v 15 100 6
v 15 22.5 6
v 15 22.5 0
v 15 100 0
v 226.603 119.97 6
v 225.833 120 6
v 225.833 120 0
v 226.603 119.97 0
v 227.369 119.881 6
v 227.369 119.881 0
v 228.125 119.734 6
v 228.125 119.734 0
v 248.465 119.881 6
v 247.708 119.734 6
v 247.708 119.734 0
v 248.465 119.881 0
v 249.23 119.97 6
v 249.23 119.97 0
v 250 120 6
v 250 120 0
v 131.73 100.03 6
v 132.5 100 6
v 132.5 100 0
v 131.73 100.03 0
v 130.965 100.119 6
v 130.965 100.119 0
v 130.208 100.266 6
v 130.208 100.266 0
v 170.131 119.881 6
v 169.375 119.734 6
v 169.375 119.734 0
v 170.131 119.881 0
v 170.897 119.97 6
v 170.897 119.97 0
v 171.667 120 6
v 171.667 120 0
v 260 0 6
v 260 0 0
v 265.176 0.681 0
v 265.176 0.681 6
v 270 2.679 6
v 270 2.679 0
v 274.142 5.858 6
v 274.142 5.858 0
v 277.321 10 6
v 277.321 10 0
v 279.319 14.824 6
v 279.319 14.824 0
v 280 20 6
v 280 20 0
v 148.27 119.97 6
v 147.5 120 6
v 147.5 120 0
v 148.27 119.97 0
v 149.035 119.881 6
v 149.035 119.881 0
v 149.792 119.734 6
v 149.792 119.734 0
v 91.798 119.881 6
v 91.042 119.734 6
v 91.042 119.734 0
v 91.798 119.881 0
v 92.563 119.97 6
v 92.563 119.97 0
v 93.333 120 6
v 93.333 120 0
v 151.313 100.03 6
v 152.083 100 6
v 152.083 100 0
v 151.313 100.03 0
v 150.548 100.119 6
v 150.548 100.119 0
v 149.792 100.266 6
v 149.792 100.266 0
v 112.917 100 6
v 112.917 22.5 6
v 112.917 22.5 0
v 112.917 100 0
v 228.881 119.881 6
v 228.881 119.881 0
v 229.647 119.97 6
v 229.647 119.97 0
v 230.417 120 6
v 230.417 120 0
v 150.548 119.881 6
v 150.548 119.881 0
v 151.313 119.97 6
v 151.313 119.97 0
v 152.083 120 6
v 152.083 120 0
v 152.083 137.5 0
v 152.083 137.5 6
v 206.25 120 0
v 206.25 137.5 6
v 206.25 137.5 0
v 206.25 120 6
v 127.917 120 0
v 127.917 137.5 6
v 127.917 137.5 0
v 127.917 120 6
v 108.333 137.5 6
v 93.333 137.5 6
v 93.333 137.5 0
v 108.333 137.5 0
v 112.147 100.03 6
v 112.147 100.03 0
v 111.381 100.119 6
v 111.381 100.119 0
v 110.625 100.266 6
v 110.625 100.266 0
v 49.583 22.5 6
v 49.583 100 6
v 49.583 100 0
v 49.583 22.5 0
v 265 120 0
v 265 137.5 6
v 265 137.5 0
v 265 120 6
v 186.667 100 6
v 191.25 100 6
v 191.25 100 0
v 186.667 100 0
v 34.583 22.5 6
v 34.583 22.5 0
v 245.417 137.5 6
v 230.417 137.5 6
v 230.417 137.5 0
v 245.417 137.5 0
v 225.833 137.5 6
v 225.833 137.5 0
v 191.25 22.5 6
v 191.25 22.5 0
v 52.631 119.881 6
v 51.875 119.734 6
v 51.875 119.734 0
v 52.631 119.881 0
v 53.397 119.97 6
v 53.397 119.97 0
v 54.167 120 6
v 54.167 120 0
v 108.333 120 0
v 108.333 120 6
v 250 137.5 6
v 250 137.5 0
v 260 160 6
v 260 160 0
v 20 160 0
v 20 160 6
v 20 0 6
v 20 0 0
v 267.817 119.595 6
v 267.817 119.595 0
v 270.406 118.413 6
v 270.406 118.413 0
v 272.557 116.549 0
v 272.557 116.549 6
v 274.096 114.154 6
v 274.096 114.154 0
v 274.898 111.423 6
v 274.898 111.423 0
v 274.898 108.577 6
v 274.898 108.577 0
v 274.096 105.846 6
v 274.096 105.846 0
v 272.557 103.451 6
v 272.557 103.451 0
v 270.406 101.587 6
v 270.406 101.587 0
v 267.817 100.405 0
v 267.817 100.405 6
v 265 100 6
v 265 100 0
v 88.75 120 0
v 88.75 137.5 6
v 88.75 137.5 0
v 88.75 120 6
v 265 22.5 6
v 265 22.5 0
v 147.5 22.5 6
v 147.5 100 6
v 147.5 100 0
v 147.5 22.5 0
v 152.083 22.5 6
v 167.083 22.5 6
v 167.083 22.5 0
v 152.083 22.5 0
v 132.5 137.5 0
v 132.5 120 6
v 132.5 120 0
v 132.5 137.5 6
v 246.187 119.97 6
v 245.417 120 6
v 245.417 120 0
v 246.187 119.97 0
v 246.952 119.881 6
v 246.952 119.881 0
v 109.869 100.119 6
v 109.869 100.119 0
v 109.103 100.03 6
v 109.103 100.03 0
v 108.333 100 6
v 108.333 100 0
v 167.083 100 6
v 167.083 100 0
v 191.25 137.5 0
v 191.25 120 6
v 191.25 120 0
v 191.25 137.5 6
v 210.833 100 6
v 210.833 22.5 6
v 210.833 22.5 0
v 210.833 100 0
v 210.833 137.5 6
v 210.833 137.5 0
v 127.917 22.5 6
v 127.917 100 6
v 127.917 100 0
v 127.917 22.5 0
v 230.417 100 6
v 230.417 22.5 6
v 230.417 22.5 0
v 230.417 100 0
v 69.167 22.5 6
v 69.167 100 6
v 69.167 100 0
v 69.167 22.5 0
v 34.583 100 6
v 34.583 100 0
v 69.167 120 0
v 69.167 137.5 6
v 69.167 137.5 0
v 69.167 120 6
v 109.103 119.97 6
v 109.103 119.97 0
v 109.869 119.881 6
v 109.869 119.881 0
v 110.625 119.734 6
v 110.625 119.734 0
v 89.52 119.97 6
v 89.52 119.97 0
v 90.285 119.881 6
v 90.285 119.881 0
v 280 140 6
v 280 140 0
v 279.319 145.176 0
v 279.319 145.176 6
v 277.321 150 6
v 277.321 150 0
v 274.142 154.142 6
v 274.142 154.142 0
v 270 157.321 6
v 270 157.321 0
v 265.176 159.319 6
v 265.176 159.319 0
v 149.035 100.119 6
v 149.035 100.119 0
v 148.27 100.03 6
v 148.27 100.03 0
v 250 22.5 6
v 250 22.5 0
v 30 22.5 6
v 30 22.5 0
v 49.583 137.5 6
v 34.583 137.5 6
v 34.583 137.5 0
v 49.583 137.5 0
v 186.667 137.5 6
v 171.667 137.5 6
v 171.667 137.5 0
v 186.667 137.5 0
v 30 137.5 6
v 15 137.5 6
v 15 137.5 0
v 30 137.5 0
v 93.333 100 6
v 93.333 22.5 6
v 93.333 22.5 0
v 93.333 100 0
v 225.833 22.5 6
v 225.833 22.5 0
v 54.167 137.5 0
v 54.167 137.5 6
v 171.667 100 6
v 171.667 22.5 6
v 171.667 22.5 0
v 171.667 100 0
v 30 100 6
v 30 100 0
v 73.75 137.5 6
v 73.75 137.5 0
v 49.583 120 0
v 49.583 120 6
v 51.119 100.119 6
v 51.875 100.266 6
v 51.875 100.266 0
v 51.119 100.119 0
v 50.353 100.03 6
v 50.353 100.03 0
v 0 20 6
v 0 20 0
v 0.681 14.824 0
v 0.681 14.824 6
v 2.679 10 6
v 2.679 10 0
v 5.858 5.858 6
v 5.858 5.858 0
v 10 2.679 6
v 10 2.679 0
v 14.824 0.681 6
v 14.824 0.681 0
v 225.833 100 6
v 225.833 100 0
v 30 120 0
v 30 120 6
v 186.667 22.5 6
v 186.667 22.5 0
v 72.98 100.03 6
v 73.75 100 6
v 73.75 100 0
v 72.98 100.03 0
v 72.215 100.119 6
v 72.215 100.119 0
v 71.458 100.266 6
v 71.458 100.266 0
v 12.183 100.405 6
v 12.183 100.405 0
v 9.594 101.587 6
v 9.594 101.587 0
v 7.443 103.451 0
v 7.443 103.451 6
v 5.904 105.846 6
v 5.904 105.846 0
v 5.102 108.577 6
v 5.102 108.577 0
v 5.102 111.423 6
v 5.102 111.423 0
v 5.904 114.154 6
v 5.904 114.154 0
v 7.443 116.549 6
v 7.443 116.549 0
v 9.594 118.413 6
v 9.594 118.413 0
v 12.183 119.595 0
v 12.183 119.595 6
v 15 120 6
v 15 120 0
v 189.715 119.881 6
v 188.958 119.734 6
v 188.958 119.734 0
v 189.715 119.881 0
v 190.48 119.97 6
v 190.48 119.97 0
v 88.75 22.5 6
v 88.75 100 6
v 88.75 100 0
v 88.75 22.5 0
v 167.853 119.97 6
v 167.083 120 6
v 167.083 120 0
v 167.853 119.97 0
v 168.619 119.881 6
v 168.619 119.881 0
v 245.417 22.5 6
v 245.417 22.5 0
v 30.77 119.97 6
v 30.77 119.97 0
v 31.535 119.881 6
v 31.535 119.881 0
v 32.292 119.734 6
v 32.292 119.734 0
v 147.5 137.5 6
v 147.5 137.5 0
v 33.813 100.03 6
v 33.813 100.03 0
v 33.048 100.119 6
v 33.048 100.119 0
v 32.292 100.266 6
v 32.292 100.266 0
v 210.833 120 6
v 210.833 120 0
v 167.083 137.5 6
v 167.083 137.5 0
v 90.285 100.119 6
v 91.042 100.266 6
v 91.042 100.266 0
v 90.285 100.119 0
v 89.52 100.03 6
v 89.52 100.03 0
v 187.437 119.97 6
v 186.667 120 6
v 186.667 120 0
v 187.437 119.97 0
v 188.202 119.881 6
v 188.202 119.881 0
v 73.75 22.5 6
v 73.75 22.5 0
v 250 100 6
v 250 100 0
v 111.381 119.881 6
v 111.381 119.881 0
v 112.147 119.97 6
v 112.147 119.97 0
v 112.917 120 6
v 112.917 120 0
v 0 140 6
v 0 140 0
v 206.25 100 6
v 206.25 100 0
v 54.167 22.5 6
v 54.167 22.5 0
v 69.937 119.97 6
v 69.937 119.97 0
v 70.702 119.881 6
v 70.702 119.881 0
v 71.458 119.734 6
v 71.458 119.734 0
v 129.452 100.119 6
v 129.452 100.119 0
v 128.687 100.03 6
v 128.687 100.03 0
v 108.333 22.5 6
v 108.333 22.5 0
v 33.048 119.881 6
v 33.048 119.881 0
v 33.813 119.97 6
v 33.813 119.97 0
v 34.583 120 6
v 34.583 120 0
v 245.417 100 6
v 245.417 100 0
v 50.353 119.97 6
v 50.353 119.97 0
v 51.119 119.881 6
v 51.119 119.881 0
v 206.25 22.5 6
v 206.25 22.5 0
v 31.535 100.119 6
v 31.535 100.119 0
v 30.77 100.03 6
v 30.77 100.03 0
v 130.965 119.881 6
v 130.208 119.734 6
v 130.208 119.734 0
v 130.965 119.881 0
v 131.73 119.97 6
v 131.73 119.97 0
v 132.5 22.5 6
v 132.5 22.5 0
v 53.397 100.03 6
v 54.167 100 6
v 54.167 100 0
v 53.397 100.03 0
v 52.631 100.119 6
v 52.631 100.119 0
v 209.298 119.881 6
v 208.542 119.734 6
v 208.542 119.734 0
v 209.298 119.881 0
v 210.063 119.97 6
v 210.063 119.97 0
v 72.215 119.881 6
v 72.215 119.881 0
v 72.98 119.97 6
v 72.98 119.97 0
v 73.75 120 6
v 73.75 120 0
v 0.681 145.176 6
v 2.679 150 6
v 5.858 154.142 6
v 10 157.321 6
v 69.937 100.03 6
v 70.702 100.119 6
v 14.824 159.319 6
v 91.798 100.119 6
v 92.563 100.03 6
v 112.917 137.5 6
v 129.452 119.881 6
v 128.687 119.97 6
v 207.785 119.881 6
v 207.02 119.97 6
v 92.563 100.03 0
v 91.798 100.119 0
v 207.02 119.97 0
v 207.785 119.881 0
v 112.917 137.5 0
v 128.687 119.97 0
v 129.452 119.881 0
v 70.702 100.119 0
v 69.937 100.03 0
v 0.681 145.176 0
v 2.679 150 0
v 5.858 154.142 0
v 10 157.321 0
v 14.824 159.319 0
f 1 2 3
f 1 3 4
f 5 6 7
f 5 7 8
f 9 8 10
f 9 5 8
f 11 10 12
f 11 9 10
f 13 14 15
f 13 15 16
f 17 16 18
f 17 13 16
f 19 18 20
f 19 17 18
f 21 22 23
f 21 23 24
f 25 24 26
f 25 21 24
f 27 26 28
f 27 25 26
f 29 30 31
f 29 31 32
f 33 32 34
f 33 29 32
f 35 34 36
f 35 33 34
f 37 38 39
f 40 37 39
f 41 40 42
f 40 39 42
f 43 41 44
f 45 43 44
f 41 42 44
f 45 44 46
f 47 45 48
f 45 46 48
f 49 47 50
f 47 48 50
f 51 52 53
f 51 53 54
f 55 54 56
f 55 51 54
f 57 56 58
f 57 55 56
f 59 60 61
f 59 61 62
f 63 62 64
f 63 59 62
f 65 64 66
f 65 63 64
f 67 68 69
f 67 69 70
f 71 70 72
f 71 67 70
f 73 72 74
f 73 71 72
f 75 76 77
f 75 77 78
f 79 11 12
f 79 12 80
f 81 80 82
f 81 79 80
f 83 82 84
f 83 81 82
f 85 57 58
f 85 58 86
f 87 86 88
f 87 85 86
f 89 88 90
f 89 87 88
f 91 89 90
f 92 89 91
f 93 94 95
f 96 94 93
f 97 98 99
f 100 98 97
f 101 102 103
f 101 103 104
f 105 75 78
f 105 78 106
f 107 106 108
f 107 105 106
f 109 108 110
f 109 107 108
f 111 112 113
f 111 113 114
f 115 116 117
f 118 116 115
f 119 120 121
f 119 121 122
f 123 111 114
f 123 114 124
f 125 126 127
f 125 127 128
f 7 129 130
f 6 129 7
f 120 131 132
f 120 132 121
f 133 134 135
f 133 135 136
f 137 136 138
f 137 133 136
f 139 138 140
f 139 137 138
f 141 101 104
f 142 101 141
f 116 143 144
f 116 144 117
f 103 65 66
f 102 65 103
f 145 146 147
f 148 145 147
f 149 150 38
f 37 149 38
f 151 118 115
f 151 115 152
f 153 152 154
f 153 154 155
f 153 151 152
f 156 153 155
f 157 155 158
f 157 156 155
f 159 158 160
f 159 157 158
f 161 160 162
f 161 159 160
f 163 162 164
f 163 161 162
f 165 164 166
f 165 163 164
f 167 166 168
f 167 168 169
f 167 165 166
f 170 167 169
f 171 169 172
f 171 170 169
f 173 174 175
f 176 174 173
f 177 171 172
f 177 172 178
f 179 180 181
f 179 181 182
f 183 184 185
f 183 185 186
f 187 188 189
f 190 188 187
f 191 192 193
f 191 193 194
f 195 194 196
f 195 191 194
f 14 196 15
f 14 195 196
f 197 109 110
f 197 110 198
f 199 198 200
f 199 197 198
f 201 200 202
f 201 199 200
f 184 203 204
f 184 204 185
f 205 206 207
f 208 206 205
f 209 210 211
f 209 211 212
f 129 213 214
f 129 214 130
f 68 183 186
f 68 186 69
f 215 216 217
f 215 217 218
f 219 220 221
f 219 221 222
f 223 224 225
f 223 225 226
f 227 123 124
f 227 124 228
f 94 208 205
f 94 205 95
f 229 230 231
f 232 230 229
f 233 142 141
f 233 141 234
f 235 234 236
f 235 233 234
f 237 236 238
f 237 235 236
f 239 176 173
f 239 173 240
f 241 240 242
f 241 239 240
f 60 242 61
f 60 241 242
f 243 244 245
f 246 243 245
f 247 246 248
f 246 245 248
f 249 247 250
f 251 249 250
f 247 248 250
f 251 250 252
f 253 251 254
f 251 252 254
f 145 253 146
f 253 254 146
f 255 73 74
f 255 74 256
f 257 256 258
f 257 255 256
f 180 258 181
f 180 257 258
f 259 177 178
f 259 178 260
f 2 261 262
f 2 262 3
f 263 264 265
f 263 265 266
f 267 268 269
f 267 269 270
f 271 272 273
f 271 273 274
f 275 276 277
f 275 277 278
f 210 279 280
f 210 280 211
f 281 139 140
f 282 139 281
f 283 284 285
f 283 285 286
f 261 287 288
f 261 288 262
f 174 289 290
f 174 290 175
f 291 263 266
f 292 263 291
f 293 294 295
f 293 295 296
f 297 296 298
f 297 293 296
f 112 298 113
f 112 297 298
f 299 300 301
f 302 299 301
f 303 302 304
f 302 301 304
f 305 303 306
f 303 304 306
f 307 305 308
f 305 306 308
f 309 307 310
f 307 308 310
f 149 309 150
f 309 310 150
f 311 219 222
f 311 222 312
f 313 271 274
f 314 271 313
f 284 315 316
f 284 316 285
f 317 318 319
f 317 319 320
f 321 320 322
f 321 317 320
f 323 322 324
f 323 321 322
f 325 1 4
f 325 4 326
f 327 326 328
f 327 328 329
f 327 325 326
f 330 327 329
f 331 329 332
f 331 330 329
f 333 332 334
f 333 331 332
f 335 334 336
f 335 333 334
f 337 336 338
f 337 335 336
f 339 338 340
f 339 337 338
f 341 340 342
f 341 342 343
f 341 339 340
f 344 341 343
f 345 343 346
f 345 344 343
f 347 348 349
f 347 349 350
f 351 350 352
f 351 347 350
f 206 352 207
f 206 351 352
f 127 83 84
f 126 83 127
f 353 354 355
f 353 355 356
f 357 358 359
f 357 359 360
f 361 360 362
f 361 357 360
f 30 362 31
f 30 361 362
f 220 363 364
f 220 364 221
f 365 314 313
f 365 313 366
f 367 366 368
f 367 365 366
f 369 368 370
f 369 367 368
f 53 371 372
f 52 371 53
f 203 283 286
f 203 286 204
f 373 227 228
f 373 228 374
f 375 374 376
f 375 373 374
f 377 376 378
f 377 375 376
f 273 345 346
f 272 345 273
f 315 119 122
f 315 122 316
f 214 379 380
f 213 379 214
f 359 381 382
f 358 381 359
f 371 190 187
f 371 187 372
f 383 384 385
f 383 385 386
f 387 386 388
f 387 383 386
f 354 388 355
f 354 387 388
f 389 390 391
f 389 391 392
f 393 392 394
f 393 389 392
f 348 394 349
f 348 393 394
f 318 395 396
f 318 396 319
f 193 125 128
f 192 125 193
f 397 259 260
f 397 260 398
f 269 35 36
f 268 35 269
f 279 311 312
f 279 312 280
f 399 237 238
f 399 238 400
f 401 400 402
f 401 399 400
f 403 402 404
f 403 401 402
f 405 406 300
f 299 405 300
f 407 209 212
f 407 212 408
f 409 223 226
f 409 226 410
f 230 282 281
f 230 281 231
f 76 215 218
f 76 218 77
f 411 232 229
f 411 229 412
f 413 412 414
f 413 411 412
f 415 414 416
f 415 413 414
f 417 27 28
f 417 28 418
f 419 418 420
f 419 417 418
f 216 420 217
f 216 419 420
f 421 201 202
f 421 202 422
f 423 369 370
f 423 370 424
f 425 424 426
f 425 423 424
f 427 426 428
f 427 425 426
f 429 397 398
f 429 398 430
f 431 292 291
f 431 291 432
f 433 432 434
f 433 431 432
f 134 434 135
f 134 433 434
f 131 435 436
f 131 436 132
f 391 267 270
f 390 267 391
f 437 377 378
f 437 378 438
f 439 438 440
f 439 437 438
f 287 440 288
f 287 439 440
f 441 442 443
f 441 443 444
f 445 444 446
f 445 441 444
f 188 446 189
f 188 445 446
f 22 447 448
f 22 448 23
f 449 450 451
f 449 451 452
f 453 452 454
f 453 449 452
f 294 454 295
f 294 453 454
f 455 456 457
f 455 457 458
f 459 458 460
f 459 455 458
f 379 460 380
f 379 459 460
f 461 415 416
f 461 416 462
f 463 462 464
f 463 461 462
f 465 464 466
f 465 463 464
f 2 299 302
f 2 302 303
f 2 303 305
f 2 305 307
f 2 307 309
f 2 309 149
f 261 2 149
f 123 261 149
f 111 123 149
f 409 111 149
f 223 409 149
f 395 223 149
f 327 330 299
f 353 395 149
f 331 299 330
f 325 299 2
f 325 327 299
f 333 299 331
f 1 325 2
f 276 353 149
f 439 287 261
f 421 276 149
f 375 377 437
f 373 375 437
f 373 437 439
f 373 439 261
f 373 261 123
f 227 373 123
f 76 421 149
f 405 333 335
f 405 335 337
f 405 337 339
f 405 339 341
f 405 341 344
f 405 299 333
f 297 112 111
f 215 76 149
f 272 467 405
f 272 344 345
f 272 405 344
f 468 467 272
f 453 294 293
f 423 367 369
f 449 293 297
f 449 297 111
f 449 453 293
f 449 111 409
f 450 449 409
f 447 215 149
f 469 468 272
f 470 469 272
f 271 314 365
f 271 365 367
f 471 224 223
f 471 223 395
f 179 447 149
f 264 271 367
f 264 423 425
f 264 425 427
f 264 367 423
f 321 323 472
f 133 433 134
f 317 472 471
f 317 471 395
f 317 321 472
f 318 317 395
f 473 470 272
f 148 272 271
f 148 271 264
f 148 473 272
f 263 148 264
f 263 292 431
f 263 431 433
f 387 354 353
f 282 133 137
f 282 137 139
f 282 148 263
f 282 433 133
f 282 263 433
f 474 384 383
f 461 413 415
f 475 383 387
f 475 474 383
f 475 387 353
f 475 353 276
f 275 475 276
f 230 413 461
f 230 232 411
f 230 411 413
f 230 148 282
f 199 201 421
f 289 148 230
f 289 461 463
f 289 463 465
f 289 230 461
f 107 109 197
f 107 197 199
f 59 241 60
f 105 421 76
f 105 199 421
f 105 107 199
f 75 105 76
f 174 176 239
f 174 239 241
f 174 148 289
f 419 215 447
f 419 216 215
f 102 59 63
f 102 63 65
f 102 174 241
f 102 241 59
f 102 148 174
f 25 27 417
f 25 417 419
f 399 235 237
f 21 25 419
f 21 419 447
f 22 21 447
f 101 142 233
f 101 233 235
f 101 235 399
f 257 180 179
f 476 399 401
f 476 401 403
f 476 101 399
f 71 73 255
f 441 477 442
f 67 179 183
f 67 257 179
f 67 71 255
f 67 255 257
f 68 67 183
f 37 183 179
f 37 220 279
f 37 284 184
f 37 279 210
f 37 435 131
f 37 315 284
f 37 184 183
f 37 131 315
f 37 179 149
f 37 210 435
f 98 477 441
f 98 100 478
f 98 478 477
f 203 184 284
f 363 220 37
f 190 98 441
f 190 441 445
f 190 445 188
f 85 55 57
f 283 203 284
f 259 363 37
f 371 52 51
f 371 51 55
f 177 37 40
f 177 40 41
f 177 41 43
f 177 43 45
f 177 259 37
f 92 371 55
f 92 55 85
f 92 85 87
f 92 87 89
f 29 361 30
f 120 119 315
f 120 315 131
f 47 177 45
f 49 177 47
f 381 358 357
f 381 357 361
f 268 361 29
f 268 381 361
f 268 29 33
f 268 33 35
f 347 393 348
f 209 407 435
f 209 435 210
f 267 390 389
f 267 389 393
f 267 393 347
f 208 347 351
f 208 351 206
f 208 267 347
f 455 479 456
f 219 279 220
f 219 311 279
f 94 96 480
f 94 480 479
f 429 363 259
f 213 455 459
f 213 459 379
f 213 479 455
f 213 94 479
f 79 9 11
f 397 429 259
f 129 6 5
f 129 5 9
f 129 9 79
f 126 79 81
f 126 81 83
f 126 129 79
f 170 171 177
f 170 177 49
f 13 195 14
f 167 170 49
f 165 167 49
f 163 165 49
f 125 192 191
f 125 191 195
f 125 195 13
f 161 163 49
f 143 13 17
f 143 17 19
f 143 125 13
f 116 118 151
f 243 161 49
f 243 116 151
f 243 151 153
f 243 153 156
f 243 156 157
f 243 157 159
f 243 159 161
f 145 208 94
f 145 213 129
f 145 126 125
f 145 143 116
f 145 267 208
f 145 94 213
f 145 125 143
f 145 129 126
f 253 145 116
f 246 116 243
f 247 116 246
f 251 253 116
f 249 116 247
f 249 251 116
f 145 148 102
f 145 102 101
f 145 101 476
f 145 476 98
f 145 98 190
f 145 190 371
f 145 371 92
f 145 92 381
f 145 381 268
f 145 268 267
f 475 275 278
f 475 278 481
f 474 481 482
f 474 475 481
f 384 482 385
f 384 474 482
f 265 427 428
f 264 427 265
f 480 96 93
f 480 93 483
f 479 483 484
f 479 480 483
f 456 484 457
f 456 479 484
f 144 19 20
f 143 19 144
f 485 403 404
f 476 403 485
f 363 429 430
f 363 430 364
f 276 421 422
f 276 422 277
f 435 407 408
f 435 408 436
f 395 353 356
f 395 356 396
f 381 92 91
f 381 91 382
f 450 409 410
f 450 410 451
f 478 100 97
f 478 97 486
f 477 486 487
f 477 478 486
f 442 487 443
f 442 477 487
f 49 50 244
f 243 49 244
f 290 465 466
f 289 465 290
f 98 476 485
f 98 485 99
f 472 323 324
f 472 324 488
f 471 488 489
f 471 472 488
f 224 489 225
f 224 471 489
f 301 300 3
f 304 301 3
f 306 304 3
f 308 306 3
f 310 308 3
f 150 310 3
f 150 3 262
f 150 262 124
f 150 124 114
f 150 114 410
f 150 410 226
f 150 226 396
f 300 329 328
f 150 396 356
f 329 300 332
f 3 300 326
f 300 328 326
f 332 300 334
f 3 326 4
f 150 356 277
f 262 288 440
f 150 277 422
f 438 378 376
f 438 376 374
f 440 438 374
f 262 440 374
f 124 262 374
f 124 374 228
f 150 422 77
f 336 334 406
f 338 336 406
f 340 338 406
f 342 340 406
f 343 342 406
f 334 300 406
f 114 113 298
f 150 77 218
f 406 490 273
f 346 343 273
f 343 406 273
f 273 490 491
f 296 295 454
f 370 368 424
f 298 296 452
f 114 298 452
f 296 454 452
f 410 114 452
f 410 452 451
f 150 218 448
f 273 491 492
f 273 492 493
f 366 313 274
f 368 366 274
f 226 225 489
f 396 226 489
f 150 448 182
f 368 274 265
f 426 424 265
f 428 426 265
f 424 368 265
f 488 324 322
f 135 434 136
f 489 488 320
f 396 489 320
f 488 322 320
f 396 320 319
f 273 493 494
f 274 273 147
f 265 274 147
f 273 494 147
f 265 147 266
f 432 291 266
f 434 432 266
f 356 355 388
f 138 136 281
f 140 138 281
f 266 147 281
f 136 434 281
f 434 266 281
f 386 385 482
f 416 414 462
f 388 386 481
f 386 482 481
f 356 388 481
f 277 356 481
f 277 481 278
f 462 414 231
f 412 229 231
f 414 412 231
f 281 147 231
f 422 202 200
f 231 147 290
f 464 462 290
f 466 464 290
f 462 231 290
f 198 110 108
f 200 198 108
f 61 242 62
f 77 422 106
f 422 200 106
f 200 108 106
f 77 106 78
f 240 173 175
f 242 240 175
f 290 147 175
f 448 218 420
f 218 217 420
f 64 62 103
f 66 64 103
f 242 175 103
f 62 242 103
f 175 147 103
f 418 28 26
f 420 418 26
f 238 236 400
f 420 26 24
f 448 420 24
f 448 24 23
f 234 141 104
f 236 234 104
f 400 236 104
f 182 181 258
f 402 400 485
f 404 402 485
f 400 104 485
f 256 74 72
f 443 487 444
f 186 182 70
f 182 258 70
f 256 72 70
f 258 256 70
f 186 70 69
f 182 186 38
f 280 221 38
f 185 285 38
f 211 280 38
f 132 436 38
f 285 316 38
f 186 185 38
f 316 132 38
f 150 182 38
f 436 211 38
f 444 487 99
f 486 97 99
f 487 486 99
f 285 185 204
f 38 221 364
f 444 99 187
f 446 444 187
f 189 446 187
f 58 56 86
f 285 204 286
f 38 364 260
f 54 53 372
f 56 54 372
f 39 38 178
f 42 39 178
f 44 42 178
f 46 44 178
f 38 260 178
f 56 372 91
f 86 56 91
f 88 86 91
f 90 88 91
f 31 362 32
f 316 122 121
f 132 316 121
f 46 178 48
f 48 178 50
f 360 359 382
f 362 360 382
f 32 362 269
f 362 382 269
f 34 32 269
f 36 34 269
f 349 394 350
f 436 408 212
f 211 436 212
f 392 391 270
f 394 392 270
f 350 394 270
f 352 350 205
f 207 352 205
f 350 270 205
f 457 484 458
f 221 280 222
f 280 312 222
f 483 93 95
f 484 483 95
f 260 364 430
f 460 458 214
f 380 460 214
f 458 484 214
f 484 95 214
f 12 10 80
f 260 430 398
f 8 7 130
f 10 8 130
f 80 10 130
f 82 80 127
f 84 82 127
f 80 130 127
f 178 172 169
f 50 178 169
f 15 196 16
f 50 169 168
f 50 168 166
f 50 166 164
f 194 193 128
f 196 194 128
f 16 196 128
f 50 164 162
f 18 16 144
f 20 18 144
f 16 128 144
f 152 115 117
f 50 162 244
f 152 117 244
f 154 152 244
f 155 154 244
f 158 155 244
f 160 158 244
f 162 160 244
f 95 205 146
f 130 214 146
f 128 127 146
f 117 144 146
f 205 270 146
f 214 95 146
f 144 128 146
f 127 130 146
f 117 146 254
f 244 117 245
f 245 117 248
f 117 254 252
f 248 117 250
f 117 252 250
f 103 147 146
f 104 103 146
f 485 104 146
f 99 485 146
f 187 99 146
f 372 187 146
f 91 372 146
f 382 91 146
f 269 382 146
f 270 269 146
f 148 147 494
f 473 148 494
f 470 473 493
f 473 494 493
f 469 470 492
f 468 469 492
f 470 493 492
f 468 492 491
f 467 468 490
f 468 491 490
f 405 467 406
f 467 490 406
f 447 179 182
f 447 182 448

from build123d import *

# Parameters (mm, degrees)
BOSS_EXTRUDE1_DEPTH = 6
CUT_EXTRUDE1_DEPTH  = 6


with BuildPart() as part:
    # Sketch1 → Boss-Extrude1 (new body)
    with BuildSketch(Plane.XY):
        with BuildLine():
            Line((20, 0), (260, 0))
            ThreePointArc((260, 0), (274.142135624, 5.857864376), (280, 20))
            Line((280, 20), (280, 140))
            ThreePointArc((280, 140), (274.142135624, 154.142135624), (260, 160))
            Line((260, 160), (20, 160))
            ThreePointArc((20, 160), (5.857864376, 154.142135624), (0, 140))
            Line((0, 140), (0, 20))
            ThreePointArc((0, 20), (5.857864376, 5.857864376), (20, 0))
        make_face()
    extrude(amount=BOSS_EXTRUDE1_DEPTH)

    # Sketch2 → Cut-Extrude1 (cut)
    with BuildSketch(Plane.XY.offset(6)):
        with BuildLine():
            Line((15, 137.5), (30, 137.5))
            Line((30, 137.5), (30, 120))
            ThreePointArc((30, 120), (31.153533726, 119.933245187), (32.291666667, 119.733871989))
            ThreePointArc((32.291666667, 119.733871989), (33.429799607, 119.933245187), (34.583333333, 120))
            Line((34.583333333, 120), (34.583333333, 137.5))
            Line((34.583333333, 137.5), (49.583333333, 137.5))
            Line((49.583333333, 137.5), (49.583333333, 120))
            ThreePointArc((49.583333333, 120), (50.736867059, 119.933245187), (51.875, 119.733871989))
            ThreePointArc((51.875, 119.733871989), (53.013132941, 119.933245187), (54.166666667, 120))
            Line((54.166666667, 120), (54.166666667, 137.5))
            Line((54.166666667, 137.5), (69.166666667, 137.5))
            Line((69.166666667, 137.5), (69.166666667, 120))
            ThreePointArc((69.166666667, 120), (70.320200393, 119.933245187), (71.458333333, 119.733871989))
            ThreePointArc((71.458333333, 119.733871989), (72.596466274, 119.933245187), (73.75, 120))
            Line((73.75, 120), (73.75, 137.5))
            Line((73.75, 137.5), (88.75, 137.5))
            Line((88.75, 137.5), (88.75, 120))
            ThreePointArc((88.75, 120), (89.903533726, 119.933245187), (91.041666667, 119.733871989))
            ThreePointArc((91.041666667, 119.733871989), (92.179799607, 119.933245187), (93.333333333, 120))
            Line((93.333333333, 120), (93.333333333, 137.5))
            Line((93.333333333, 137.5), (108.333333333, 137.5))
            Line((108.333333333, 137.5), (108.333333333, 120))
            ThreePointArc((108.333333333, 120), (109.486867059, 119.933245187), (110.625, 119.733871989))
            ThreePointArc((110.625, 119.733871989), (111.763132941, 119.933245187), (112.916666667, 120))
            Line((112.916666667, 120), (112.916666667, 137.5))
            Line((112.916666667, 137.5), (127.916666667, 137.5))
            Line((127.916666667, 137.5), (127.916666667, 120))
            ThreePointArc((127.916666667, 120), (129.070200393, 119.933245187), (130.208333333, 119.733871989))
            ThreePointArc((130.208333333, 119.733871989), (131.346466274, 119.933245187), (132.5, 120))
            Line((132.5, 120), (132.5, 137.5))
            Line((132.5, 137.5), (147.5, 137.5))
            Line((147.5, 137.5), (147.5, 120))
            ThreePointArc((147.5, 120), (148.653533726, 119.933245187), (149.791666667, 119.733871989))
            ThreePointArc((149.791666667, 119.733871989), (150.929799607, 119.933245187), (152.083333333, 120))
            Line((152.083333333, 120), (152.083333333, 137.5))
            Line((152.083333333, 137.5), (167.083333333, 137.5))
            Line((167.083333333, 137.5), (167.083333333, 120))
            ThreePointArc((167.083333333, 120), (168.236867059, 119.933245187), (169.375, 119.733871989))
            ThreePointArc((169.375, 119.733871989), (170.513132941, 119.933245187), (171.666666667, 120))
            Line((171.666666667, 120), (171.666666667, 137.5))
            Line((171.666666667, 137.5), (186.666666667, 137.5))
            Line((186.666666667, 137.5), (186.666666667, 120))
            ThreePointArc((186.666666667, 120), (187.820200393, 119.933245187), (188.958333333, 119.733871989))
            ThreePointArc((188.958333333, 119.733871989), (190.096466274, 119.933245187), (191.25, 120))
            Line((191.25, 120), (191.25, 137.5))
            Line((191.25, 137.5), (206.25, 137.5))
            Line((206.25, 137.5), (206.25, 120))
            ThreePointArc((206.25, 120), (207.403533726, 119.933245187), (208.541666667, 119.733871989))
            ThreePointArc((208.541666667, 119.733871989), (209.679799607, 119.933245187), (210.833333333, 120))
            Line((210.833333333, 120), (210.833333333, 137.5))
            Line((210.833333333, 137.5), (225.833333333, 137.5))
            Line((225.833333333, 137.5), (225.833333333, 120))
            ThreePointArc((225.833333333, 120), (226.986867059, 119.933245187), (228.125, 119.733871989))
            ThreePointArc((228.125, 119.733871989), (229.263132941, 119.933245187), (230.416666667, 120))
            Line((230.416666667, 120), (230.416666667, 137.5))
            Line((230.416666667, 137.5), (245.416666667, 137.5))
            Line((245.416666667, 137.5), (245.416666667, 120))
            ThreePointArc((245.416666667, 120), (246.570200393, 119.933245187), (247.708333333, 119.733871989))
            ThreePointArc((247.708333333, 119.733871989), (248.846466274, 119.933245187), (250, 120))
            Line((250, 120), (250, 137.5))
            Line((250, 137.5), (265, 137.5))
            Line((265, 137.5), (265, 120))
            ThreePointArc((265, 120), (275, 110), (265, 100))
            Line((265, 100), (265, 22.5))
            Line((265, 22.5), (250, 22.5))
            Line((250, 22.5), (250, 100))
            Line((250, 100), (245.416666667, 100))
            Line((245.416666667, 100), (245.416666667, 22.5))
            Line((245.416666667, 22.5), (230.416666667, 22.5))
            Line((230.416666667, 22.5), (230.416666667, 100))
            Line((230.416666667, 100), (225.833333333, 100))
            Line((225.833333333, 100), (225.833333333, 22.5))
            Line((225.833333333, 22.5), (210.833333333, 22.5))
            Line((210.833333333, 22.5), (210.833333333, 100))
            Line((210.833333333, 100), (206.25, 100))
            Line((206.25, 100), (206.25, 22.5))
            Line((206.25, 22.5), (191.25, 22.5))
            Line((191.25, 22.5), (191.25, 100))
            Line((191.25, 100), (186.666666667, 100))
            Line((186.666666667, 100), (186.666666667, 22.5))
            Line((186.666666667, 22.5), (171.666666667, 22.5))
            Line((171.666666667, 22.5), (171.666666667, 100))
            Line((171.666666667, 100), (167.083333333, 100))
            Line((167.083333333, 100), (167.083333333, 22.5))
            Line((167.083333333, 22.5), (152.083333333, 22.5))
            Line((152.083333333, 22.5), (152.083333333, 100))
            ThreePointArc((152.083333333, 100), (150.929799607, 100.066754813), (149.791666667, 100.266128011))
            ThreePointArc((149.791666667, 100.266128011), (148.653533726, 100.066754813), (147.5, 100))
            Line((147.5, 100), (147.5, 22.5))
            Line((147.5, 22.5), (132.5, 22.5))
            Line((132.5, 22.5), (132.5, 100))
            ThreePointArc((132.5, 100), (131.346466274, 100.066754813), (130.208333333, 100.266128011))
            ThreePointArc((130.208333333, 100.266128011), (129.070200393, 100.066754813), (127.916666667, 100))
            Line((127.916666667, 100), (127.916666667, 22.5))
            Line((127.916666667, 22.5), (112.916666667, 22.5))
            Line((112.916666667, 22.5), (112.916666667, 100))
            ThreePointArc((112.916666667, 100), (111.763132941, 100.066754813), (110.625, 100.266128011))
            ThreePointArc((110.625, 100.266128011), (109.486867059, 100.066754813), (108.333333333, 100))
            Line((108.333333333, 100), (108.333333333, 22.5))
            Line((108.333333333, 22.5), (93.333333333, 22.5))
            Line((93.333333333, 22.5), (93.333333333, 100))
            ThreePointArc((93.333333333, 100), (92.179799607, 100.066754813), (91.041666667, 100.266128011))
            ThreePointArc((91.041666667, 100.266128011), (89.903533726, 100.066754813), (88.75, 100))
            Line((88.75, 100), (88.75, 22.5))
            Line((88.75, 22.5), (73.75, 22.5))
            Line((73.75, 22.5), (73.75, 100))
            ThreePointArc((73.75, 100), (72.596466274, 100.066754813), (71.458333333, 100.266128011))
            ThreePointArc((71.458333333, 100.266128011), (70.320200393, 100.066754813), (69.166666667, 100))
            Line((69.166666667, 100), (69.166666667, 22.5))
            Line((69.166666667, 22.5), (54.166666667, 22.5))
            Line((54.166666667, 22.5), (54.166666667, 100))
            ThreePointArc((54.166666667, 100), (53.013132941, 100.066754813), (51.875, 100.266128011))
            ThreePointArc((51.875, 100.266128011), (50.736867059, 100.066754813), (49.583333333, 100))
            Line((49.583333333, 100), (49.583333333, 22.5))
            Line((49.583333333, 22.5), (34.583333333, 22.5))
            Line((34.583333333, 22.5), (34.583333333, 100))
            ThreePointArc((34.583333333, 100), (33.429799607, 100.066754813), (32.291666667, 100.266128011))
            ThreePointArc((32.291666667, 100.266128011), (31.153533726, 100.066754813), (30, 100))
            Line((30, 100), (30, 22.5))
            Line((30, 22.5), (15, 22.5))
            Line((15, 22.5), (15, 100))
            ThreePointArc((15, 100), (5, 110), (15, 120))
            Line((15, 120), (15, 137.5))
        make_face()
    extrude(amount=-CUT_EXTRUDE1_DEPTH, mode=Mode.SUBTRACT)


solid = part.part
